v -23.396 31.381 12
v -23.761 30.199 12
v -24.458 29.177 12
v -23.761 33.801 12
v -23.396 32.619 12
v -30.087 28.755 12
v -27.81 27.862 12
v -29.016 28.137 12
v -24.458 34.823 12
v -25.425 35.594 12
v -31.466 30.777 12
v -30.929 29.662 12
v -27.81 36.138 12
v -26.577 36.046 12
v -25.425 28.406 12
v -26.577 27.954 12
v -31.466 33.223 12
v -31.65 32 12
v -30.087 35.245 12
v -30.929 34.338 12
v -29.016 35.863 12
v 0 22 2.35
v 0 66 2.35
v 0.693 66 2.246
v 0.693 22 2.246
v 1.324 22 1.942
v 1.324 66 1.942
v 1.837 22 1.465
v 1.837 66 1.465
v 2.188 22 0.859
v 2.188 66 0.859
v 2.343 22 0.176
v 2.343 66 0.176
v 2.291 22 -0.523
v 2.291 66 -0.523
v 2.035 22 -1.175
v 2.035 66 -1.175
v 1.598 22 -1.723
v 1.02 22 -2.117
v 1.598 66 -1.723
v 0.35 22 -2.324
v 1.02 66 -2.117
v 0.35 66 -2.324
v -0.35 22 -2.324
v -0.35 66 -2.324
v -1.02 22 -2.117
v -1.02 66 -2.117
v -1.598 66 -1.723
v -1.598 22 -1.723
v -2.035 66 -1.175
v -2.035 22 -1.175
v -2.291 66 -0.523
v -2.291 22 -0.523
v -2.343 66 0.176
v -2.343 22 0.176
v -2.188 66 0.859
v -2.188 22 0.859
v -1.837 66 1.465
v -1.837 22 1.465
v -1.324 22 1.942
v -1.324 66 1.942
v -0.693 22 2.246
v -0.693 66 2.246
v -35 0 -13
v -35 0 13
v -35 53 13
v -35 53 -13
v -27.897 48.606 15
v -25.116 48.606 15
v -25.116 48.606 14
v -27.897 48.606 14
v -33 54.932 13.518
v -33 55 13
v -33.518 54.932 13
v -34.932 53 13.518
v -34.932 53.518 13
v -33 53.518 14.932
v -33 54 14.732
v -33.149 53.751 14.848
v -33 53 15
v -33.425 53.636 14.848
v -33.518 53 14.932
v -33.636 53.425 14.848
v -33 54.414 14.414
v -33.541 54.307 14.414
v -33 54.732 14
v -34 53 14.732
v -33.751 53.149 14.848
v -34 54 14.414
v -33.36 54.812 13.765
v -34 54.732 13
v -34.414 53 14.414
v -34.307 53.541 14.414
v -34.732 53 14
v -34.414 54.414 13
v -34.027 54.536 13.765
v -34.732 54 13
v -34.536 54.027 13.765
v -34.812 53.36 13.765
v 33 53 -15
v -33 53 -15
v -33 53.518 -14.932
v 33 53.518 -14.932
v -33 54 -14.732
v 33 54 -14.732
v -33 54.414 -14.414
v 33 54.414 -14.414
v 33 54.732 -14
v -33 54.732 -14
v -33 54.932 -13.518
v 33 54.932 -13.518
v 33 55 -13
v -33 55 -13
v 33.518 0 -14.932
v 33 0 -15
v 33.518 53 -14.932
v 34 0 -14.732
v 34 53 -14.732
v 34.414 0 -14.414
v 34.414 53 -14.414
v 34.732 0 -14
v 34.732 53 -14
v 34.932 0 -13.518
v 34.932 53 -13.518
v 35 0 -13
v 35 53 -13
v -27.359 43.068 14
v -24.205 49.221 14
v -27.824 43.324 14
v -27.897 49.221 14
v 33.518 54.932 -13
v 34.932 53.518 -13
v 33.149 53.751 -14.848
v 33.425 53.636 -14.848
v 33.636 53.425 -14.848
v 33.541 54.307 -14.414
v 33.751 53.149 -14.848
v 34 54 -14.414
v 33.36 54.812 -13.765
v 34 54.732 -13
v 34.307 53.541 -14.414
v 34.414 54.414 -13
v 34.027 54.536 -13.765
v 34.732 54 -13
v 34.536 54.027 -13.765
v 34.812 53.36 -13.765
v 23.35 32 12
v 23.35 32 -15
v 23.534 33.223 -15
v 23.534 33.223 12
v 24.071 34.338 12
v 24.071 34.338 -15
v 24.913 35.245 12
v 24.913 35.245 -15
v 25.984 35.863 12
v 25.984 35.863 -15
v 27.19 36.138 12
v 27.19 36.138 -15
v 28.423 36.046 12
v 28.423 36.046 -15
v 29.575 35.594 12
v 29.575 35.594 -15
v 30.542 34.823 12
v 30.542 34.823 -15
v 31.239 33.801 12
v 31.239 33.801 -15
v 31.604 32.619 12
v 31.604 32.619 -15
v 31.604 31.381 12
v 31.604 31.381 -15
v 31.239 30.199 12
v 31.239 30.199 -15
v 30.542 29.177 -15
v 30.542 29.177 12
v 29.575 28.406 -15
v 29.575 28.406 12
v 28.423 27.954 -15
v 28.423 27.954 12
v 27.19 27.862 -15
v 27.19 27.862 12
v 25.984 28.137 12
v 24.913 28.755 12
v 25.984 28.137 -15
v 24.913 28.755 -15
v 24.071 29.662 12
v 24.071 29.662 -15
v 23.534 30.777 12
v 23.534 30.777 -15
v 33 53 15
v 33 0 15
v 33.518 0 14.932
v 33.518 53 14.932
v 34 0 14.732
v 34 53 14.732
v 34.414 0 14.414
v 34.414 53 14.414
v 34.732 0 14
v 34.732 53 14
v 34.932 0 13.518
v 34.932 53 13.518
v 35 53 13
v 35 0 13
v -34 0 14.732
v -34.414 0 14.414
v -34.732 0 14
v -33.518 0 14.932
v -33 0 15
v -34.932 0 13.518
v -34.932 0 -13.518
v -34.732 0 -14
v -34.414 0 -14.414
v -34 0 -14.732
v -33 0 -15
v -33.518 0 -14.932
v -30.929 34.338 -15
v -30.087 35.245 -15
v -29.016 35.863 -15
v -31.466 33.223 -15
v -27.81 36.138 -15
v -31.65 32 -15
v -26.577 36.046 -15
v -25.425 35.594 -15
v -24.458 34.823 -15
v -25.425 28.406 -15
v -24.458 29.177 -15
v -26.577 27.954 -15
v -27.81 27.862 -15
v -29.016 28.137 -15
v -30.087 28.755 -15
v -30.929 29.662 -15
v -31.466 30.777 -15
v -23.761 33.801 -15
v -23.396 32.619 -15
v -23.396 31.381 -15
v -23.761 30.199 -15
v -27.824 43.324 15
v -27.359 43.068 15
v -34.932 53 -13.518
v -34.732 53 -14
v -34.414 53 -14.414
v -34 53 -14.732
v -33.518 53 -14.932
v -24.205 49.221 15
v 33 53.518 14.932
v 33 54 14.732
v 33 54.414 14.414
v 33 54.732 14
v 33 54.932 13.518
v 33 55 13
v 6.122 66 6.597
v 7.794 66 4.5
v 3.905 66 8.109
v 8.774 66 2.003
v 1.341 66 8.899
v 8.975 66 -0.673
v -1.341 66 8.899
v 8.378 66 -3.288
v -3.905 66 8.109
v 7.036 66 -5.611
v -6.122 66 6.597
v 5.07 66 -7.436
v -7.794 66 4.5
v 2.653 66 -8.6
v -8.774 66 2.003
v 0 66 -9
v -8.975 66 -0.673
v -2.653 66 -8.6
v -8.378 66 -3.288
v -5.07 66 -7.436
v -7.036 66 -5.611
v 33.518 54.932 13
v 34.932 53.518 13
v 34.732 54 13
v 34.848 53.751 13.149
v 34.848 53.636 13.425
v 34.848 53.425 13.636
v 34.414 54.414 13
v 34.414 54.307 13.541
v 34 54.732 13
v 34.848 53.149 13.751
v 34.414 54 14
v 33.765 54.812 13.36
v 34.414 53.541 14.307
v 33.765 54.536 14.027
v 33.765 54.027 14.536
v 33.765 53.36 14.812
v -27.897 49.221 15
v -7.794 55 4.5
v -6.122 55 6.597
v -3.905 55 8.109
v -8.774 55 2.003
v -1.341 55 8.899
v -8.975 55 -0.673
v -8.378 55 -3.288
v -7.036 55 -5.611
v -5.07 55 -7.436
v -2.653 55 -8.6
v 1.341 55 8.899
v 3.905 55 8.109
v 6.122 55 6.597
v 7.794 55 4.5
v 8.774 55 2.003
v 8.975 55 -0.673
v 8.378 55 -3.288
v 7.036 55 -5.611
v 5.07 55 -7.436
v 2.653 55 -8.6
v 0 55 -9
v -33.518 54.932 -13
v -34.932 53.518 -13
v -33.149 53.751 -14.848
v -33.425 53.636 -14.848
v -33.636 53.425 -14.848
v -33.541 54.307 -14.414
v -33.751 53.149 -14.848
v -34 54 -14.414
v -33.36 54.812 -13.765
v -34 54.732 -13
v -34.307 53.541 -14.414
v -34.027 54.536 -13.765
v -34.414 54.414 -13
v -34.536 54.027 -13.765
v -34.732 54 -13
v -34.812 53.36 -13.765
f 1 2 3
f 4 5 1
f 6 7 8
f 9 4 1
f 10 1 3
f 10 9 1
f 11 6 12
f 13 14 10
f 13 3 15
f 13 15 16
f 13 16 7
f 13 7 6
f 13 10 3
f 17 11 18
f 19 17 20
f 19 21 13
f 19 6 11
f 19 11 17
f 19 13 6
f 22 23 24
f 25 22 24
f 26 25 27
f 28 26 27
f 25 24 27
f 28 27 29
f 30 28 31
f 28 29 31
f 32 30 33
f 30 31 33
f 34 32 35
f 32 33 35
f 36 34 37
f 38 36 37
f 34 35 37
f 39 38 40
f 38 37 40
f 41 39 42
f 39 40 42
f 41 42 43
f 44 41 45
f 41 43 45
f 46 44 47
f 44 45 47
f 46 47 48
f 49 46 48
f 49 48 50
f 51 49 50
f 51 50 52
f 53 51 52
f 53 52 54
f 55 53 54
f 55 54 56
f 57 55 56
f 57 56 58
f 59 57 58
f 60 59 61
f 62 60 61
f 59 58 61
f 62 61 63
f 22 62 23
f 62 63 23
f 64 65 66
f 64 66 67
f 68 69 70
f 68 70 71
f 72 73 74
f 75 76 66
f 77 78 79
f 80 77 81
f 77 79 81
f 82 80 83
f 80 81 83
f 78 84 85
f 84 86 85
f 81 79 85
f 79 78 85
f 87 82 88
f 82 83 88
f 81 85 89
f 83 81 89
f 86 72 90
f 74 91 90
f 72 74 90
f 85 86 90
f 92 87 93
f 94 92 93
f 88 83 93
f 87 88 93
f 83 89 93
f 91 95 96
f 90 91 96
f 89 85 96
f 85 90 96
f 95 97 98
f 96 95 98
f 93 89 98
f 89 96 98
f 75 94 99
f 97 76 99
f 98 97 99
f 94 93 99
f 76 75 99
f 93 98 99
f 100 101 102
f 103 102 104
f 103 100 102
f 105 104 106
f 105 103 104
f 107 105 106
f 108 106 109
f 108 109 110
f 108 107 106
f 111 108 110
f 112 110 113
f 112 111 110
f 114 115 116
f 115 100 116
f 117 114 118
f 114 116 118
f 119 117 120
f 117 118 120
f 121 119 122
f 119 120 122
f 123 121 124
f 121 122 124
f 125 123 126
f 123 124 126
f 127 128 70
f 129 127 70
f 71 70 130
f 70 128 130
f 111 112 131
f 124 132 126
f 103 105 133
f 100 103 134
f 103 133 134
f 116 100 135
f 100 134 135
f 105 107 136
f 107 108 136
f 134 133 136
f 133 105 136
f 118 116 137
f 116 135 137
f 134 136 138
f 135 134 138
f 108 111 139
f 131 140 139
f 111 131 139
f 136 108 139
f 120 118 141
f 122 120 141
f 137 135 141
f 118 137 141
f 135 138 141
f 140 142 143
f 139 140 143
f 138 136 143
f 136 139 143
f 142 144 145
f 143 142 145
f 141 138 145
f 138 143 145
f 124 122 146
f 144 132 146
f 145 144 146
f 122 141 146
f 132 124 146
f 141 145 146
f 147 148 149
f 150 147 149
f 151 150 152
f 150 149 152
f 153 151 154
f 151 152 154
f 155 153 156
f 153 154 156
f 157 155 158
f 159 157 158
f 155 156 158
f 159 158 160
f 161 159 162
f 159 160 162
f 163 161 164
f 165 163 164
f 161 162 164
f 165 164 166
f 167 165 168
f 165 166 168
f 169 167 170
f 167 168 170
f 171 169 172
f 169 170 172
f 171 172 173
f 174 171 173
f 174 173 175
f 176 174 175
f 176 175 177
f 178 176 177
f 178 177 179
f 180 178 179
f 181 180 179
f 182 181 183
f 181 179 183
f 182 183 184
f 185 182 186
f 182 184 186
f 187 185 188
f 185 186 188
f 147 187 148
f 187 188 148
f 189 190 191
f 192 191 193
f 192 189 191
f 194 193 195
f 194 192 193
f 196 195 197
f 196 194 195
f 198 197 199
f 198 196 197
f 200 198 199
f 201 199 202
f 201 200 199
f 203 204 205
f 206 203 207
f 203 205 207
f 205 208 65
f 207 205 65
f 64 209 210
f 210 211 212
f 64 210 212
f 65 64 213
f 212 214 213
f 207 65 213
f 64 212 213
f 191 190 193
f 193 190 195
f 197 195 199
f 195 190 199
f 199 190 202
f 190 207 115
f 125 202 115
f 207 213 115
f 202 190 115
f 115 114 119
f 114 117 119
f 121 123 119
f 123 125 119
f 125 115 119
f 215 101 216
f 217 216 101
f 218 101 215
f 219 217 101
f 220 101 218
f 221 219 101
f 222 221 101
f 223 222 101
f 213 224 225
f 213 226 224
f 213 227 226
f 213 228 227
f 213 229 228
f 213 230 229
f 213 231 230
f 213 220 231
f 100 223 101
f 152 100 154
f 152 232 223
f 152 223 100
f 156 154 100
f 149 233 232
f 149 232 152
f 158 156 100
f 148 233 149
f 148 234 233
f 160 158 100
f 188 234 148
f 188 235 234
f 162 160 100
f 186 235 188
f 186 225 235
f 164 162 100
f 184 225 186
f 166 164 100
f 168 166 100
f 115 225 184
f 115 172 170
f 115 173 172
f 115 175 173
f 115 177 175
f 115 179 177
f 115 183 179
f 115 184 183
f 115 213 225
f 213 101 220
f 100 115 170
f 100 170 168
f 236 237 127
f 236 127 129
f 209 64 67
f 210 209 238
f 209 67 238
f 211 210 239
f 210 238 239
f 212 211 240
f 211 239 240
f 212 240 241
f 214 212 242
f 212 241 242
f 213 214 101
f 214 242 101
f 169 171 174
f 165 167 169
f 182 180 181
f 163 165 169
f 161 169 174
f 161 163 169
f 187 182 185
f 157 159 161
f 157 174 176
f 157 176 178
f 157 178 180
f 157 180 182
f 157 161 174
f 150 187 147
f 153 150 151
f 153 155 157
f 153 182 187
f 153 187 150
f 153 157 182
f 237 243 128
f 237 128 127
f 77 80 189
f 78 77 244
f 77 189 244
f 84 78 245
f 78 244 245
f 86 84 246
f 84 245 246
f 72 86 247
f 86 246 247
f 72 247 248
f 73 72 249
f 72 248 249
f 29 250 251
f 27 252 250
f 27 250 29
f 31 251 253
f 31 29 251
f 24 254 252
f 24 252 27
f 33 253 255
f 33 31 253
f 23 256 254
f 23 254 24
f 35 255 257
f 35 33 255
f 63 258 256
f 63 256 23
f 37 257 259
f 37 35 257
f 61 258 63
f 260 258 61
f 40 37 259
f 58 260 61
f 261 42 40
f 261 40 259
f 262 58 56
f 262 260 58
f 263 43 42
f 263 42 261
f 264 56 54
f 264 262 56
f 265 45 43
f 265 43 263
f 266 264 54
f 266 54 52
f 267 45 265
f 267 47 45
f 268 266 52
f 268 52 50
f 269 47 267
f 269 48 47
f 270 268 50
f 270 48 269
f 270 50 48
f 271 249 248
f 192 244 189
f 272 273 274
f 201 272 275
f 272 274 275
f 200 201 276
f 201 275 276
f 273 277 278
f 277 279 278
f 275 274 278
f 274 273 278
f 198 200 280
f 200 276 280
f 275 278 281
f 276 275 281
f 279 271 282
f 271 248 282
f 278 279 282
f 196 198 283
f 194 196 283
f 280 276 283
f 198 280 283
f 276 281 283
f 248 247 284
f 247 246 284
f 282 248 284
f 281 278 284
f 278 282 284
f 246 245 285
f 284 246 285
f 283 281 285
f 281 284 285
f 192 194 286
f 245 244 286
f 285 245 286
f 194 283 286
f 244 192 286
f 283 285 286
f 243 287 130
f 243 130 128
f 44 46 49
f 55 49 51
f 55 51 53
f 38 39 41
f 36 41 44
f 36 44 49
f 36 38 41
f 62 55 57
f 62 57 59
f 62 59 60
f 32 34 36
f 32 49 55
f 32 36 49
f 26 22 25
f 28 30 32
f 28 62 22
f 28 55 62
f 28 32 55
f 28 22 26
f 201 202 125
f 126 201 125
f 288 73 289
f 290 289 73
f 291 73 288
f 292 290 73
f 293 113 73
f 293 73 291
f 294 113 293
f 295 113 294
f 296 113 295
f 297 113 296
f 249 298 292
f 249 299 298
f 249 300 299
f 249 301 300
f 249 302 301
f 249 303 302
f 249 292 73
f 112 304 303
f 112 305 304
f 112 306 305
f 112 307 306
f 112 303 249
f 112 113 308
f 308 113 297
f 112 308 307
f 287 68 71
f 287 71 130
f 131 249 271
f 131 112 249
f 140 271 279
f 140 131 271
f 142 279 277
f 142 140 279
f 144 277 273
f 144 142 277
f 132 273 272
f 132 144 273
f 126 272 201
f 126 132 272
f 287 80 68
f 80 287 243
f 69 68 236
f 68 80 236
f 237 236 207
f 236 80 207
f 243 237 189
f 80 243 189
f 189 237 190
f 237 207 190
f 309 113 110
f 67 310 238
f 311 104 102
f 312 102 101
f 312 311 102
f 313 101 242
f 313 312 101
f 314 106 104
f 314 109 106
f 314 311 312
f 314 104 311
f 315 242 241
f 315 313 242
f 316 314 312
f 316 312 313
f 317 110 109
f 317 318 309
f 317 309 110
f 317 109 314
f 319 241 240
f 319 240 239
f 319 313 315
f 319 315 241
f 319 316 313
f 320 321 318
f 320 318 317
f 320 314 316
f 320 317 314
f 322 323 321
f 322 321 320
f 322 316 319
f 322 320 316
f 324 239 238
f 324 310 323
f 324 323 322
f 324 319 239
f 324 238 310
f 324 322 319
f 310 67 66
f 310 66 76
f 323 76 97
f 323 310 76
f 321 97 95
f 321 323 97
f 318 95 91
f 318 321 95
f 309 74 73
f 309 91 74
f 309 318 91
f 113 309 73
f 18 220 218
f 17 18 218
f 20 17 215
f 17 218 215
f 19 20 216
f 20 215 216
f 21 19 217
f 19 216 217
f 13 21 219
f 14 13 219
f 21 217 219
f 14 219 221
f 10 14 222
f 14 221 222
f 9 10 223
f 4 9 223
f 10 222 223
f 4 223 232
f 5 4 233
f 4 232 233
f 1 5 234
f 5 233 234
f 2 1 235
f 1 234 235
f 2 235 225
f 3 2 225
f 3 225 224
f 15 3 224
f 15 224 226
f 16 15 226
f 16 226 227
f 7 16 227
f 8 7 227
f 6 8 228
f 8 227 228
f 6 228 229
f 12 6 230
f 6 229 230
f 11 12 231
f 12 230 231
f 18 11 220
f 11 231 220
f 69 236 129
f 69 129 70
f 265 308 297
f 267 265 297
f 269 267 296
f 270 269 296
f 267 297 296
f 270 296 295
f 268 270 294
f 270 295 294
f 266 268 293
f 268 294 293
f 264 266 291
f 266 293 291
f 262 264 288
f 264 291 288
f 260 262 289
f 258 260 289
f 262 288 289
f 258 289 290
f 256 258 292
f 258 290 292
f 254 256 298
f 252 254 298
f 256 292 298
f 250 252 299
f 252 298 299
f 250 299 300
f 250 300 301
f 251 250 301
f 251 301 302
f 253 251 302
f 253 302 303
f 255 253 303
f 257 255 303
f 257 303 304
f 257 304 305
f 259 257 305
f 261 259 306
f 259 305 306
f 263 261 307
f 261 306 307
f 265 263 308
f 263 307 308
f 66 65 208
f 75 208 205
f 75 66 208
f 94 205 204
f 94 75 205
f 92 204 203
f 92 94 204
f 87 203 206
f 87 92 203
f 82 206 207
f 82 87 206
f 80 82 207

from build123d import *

# Parameters (mm, degrees)
CROQUIS1_W              = 70
CROQUIS1_H              = 30
SALIENTE_EXTRUIR1_DEPTH = 55
CROQUIS9_R              = 4.15
CORTAR_EXTRUIR6_DEPTH   = 27
REDONDEO1_R             = 2
CORTAR_EXTRUIR9_DEPTH   = 1
CROQUIS13_R             = 9
SALIENTE_EXTRUIR2_DEPTH = 11
CROQUIS14_R             = 2.35
CORTAR_EXTRUIR10_DEPTH  = 44


with BuildPart() as part:
    # Croquis1 → Saliente-Extruir1 (new body)
    with BuildSketch(Plane(origin=(0, 0, 0), x_dir=(1, 0, 0), z_dir=(0, 1, 0))):
        Rectangle(CROQUIS1_W, CROQUIS1_H)
    extrude(amount=SALIENTE_EXTRUIR1_DEPTH)

    # Croquis9 → Cortar-Extruir6 (cut)
    with BuildSketch(Plane(origin=(0, 0, -15), x_dir=(-1, 0, 0), z_dir=(0, 0, -1))):
        with Locations((-27.5, 32)):
            Circle(CROQUIS9_R)
        with Locations((27.5, 32)):
            Circle(CROQUIS9_R)
    extrude(amount=-CORTAR_EXTRUIR6_DEPTH, mode=Mode.SUBTRACT)

    # Redondeo1
    redondeo1_edges = [part.edges().sort_by_distance(p)[0] for p in [
        (-35, 55, 0),
        (0, 55, 15),
        (35, 55, 0),
        (0, 55, -15),
        (35, 27.5, 15),
        (-35, 27.5, 15),
        (-35, 27.5, -15),
        (35, 27.5, -15),
    ]]
    fillet(redondeo1_edges, radius=REDONDEO1_R)

    # Croquis12 → Cortar-Extruir9 (cut)
    with BuildSketch(Plane.XY.offset(15)):
        Polygon((-27.897004406, 49.221392525), (-24.204696713, 49.221392525), (-27.358542867, 43.067546371), (-27.823687098, 43.323555986), (-25.115754406, 48.606007909), (-27.897004406, 48.606007909), align=None)
    extrude(amount=-CORTAR_EXTRUIR9_DEPTH, mode=Mode.SUBTRACT)

    # Croquis13 → Saliente-Extruir2 (add)
    with BuildSketch(Plane(origin=(0, 55, 0), x_dir=(1, 0, 0), z_dir=(0, 1, 0))):
        with Locations(Location((0, 0, 0), (0, 0, 90))):
            Circle(CROQUIS13_R)
    extrude(amount=SALIENTE_EXTRUIR2_DEPTH)

    # Croquis14 → Cortar-Extruir10 (cut)
    with BuildSketch(Plane(origin=(0, 66, 0), x_dir=(1, 0, 0), z_dir=(0, 1, 0))):
        with Locations(Location((0, 0, 0), (0, 0, 270))):
            Circle(CROQUIS14_R)
    extrude(amount=-CORTAR_EXTRUIR10_DEPTH, mode=Mode.SUBTRACT)


solid = part.part
